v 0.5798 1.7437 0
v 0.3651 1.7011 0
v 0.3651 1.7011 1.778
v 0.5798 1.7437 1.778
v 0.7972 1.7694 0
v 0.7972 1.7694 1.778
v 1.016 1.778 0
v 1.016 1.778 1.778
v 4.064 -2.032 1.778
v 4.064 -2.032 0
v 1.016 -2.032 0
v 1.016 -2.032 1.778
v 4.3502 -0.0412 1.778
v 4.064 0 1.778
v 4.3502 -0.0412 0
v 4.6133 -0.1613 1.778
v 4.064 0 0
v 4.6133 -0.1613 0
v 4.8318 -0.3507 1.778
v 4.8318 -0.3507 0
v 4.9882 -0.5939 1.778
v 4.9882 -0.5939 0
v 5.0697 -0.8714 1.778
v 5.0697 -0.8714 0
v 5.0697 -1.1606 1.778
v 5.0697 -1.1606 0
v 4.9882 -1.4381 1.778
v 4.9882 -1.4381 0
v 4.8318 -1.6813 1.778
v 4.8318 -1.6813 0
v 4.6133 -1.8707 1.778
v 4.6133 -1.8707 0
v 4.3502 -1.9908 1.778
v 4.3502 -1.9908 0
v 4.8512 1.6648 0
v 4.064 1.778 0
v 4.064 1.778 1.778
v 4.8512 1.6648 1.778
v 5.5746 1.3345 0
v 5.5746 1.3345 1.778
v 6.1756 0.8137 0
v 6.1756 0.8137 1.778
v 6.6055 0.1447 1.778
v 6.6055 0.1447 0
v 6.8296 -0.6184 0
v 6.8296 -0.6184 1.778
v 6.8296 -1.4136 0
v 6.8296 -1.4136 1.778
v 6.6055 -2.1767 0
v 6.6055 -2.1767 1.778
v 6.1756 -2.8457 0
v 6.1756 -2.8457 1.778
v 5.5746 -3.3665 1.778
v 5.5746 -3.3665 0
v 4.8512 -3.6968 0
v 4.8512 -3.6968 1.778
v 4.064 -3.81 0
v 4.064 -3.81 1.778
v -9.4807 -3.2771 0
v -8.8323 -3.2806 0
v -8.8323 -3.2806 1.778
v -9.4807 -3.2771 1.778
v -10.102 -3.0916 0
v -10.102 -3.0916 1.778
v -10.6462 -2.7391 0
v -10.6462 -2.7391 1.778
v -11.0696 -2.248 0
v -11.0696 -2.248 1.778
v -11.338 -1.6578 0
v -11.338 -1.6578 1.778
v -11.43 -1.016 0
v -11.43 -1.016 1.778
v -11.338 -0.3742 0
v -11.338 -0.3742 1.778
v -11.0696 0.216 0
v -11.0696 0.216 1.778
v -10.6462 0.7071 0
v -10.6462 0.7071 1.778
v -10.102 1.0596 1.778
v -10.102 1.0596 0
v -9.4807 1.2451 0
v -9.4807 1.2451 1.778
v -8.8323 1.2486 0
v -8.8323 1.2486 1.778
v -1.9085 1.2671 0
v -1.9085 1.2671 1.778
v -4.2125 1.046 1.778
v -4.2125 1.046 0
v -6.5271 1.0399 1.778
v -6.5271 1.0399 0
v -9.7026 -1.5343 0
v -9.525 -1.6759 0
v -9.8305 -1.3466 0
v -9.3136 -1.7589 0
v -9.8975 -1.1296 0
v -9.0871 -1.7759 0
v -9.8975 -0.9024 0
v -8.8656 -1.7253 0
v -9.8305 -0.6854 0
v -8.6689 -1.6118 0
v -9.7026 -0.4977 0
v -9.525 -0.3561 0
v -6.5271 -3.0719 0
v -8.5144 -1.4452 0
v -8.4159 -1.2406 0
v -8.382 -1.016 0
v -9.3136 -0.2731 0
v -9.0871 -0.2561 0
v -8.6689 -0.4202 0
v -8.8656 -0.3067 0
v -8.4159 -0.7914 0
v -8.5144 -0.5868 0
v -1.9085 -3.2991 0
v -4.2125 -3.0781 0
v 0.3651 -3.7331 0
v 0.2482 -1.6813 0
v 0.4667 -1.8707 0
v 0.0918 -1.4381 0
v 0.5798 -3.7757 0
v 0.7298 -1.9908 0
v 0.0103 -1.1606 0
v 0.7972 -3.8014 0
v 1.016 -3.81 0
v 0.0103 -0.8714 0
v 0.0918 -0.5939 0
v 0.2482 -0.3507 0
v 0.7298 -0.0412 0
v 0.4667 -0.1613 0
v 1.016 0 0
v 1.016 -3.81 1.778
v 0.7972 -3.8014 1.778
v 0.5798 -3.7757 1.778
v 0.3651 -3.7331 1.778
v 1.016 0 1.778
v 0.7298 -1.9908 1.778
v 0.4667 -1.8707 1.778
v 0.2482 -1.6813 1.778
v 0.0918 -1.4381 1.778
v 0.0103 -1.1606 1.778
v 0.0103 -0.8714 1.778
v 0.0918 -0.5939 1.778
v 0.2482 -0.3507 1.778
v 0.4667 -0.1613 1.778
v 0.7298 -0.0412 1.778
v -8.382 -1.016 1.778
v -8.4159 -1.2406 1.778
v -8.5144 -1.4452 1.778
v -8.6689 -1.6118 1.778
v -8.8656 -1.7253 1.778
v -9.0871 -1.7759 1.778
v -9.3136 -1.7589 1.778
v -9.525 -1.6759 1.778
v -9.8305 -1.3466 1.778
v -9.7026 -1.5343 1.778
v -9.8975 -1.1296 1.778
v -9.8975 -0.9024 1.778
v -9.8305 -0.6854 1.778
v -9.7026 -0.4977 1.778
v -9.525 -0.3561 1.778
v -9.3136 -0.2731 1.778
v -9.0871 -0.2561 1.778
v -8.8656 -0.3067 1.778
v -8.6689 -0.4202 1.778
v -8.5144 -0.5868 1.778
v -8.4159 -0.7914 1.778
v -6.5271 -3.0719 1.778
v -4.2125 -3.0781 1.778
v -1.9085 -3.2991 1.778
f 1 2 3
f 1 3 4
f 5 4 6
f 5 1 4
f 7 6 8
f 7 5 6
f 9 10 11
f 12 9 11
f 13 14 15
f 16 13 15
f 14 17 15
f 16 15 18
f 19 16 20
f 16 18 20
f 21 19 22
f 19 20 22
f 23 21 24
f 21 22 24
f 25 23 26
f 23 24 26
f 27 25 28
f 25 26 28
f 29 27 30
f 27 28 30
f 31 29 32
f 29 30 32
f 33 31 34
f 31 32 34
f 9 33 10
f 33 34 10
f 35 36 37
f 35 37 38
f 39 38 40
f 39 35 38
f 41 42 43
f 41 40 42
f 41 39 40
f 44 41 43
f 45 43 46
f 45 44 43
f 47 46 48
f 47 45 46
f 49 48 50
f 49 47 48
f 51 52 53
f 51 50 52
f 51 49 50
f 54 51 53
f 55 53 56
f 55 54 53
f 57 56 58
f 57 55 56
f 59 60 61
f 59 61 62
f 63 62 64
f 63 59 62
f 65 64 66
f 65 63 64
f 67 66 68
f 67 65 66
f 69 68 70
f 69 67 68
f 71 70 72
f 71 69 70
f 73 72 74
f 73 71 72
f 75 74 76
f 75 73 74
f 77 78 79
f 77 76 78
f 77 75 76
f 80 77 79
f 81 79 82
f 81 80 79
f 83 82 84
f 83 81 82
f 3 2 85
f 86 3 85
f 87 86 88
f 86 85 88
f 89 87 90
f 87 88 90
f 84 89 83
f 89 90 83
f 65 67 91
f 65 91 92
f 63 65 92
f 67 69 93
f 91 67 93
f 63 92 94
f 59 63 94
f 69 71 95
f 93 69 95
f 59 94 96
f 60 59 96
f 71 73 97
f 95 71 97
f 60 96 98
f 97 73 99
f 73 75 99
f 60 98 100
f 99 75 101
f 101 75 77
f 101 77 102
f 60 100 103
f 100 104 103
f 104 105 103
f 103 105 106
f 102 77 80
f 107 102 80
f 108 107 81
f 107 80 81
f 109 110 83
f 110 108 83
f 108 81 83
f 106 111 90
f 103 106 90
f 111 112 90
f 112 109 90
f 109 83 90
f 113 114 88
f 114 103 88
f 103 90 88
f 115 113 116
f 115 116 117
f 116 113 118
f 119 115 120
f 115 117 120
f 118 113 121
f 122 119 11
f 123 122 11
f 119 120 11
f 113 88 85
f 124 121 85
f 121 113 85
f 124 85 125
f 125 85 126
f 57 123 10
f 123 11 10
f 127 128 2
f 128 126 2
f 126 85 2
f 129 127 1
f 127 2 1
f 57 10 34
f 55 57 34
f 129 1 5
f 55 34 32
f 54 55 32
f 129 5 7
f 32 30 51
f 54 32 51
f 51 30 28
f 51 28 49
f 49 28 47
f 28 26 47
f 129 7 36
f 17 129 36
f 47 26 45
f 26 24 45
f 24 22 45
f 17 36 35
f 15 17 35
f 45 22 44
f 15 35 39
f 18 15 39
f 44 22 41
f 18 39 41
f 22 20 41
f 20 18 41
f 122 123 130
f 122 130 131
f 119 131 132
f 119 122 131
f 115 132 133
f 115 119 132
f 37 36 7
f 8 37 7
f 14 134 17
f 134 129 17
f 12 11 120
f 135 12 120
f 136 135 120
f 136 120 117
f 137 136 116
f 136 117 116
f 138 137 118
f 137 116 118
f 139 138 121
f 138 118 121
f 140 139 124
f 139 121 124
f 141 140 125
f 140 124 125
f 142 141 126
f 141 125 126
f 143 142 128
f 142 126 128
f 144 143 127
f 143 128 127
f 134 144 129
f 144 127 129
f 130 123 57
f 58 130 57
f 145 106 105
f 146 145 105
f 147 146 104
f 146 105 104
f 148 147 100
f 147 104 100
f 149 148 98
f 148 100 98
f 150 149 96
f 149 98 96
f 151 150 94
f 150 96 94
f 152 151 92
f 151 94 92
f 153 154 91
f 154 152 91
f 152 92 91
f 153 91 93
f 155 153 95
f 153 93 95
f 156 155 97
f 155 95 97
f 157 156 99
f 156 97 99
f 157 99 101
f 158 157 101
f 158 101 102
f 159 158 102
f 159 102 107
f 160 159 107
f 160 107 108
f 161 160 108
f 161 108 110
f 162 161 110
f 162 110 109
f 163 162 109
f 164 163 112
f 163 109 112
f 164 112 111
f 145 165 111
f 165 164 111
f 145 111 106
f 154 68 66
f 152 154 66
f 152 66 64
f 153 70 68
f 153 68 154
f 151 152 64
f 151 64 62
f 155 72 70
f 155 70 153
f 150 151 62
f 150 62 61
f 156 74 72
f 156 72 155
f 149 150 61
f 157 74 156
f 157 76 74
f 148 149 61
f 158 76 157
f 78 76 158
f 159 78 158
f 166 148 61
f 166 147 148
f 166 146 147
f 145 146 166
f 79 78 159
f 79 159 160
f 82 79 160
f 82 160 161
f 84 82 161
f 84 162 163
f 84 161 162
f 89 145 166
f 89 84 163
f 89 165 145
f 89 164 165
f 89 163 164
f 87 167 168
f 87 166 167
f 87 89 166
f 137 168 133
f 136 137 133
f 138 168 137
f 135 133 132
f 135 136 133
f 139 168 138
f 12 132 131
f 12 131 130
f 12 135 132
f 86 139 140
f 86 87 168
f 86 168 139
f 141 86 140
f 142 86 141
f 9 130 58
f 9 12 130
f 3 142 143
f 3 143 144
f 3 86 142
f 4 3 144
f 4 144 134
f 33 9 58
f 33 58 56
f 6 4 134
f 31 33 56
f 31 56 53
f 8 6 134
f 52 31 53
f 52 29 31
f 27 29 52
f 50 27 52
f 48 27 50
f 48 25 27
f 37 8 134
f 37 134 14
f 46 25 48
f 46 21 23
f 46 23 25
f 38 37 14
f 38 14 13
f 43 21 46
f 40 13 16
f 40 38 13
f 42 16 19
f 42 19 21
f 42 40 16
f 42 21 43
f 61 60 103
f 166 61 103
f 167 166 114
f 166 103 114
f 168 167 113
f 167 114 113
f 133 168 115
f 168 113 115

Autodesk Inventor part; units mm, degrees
ref_plane "YZ Plane" through (0, 0, 0) normal (1, 0, 0) x (0, 1, 0)
ref_plane "XZ Plane" through (0, 0, 0) normal (0, 1, 0) x (-1, 0, 0)
ref_plane "XY Plane" through (0, 0, 0) normal (0, 0, 1) x (1, 0, 0)
sketch "Sketch1" plane through (0, 0, 0) normal (0, 0, 1) x (1, 0, 0)
  line L0 (1.016, 0) -> (4.064, 0)
  line L1 (5.08, -1.016) -> (5.08, -1.016)
  line L2 (4.064, -2.032) -> (1.016, -2.032)
  line L3 (0, -1.016) -> (0, -1.016)
  line L4 (1.016, -3.81) -> (4.064, -3.81)
  line L5 (6.858, -1.016) -> (6.858, -1.016)
  line L6 (4.064, 1.778) -> (1.016, 1.778)
  line L7 (-1.778, -1.016) -> (-1.778, -1.016)
  arc A0 (6.858, -1.016) -> (4.064, 1.778) centre (4.064, -1.016) ccw
  arc A1 (4.064, -3.81) -> (6.858, -1.016) centre (4.064, -1.016) ccw
  arc A2 (5.08, -1.016) -> (4.064, 0) centre (4.064, -1.016) ccw
  arc A3 (4.064, -2.032) -> (5.08, -1.016) centre (4.064, -1.016) ccw
  arc A4 (1.016, 0) -> (0, -1.016) centre (1.016, -1.016) ccw
  arc A5 (0, -1.016) -> (1.016, -2.032) centre (1.016, -1.016) ccw
  circle A6 centre (-9.144, -1.016) radius 2.286
  circle A7 centre (-9.144, -1.016) radius 0.762
  arc A8 (1.016, 1.778) -> (-1.778, -1.016) centre (1.016, -1.016) ccw
  arc A9 (-1.778, -1.016) -> (1.016, -3.81) centre (1.016, -1.016) ccw
  arc A10 (-8.8323, 1.2486) -> (0.3651, 1.7011) centre (-5.4362, 25.9197) ccw
  arc A11 (0.3651, -3.7331) -> (-8.8323, -3.2806) centre (-5.4362, -27.9517) ccw
  line L8 (-8.0967, 1.016) -> (-0.9017, 1.016) construction
  line L9 (-8.0967, -3.048) -> (-0.9017, -3.048) construction
  line L10 (-6.858, -1.016) -> (-1.778, -1.016) construction
  point P0 (0, 0)
  point P1 (5.08, -2.032)
  point P2 (5.08, 0)
  point P3 (0, -2.032)
  point P4 (6.858, -3.81)
  point P5 (6.858, 1.778)
  point P6 (-8.382, -1.016)
  point P7 (5.08, -1.016)
  dimension "d15" = 1.524
  dimension "d0" = 5.08
  dimension "d1" = 2.032
  dimension "d2" = 1.778
  dimension "d3" = 5.588
  dimension "d4" = 2.794
  dimension "d5" = 2.794
  dimension "d6" = 1.016
  dimension "d8" = 1.524
  dimension "d9" = 2.794
  dimension "d10" = 8.382
  dimension "d11" = 4.064
  dimension "d12" = 2.032
extrude "Extrusion1" add sketch "Sketch1" along normal blind 1.778
properties part number "Elbow holder" material "Phenolic Resin"
